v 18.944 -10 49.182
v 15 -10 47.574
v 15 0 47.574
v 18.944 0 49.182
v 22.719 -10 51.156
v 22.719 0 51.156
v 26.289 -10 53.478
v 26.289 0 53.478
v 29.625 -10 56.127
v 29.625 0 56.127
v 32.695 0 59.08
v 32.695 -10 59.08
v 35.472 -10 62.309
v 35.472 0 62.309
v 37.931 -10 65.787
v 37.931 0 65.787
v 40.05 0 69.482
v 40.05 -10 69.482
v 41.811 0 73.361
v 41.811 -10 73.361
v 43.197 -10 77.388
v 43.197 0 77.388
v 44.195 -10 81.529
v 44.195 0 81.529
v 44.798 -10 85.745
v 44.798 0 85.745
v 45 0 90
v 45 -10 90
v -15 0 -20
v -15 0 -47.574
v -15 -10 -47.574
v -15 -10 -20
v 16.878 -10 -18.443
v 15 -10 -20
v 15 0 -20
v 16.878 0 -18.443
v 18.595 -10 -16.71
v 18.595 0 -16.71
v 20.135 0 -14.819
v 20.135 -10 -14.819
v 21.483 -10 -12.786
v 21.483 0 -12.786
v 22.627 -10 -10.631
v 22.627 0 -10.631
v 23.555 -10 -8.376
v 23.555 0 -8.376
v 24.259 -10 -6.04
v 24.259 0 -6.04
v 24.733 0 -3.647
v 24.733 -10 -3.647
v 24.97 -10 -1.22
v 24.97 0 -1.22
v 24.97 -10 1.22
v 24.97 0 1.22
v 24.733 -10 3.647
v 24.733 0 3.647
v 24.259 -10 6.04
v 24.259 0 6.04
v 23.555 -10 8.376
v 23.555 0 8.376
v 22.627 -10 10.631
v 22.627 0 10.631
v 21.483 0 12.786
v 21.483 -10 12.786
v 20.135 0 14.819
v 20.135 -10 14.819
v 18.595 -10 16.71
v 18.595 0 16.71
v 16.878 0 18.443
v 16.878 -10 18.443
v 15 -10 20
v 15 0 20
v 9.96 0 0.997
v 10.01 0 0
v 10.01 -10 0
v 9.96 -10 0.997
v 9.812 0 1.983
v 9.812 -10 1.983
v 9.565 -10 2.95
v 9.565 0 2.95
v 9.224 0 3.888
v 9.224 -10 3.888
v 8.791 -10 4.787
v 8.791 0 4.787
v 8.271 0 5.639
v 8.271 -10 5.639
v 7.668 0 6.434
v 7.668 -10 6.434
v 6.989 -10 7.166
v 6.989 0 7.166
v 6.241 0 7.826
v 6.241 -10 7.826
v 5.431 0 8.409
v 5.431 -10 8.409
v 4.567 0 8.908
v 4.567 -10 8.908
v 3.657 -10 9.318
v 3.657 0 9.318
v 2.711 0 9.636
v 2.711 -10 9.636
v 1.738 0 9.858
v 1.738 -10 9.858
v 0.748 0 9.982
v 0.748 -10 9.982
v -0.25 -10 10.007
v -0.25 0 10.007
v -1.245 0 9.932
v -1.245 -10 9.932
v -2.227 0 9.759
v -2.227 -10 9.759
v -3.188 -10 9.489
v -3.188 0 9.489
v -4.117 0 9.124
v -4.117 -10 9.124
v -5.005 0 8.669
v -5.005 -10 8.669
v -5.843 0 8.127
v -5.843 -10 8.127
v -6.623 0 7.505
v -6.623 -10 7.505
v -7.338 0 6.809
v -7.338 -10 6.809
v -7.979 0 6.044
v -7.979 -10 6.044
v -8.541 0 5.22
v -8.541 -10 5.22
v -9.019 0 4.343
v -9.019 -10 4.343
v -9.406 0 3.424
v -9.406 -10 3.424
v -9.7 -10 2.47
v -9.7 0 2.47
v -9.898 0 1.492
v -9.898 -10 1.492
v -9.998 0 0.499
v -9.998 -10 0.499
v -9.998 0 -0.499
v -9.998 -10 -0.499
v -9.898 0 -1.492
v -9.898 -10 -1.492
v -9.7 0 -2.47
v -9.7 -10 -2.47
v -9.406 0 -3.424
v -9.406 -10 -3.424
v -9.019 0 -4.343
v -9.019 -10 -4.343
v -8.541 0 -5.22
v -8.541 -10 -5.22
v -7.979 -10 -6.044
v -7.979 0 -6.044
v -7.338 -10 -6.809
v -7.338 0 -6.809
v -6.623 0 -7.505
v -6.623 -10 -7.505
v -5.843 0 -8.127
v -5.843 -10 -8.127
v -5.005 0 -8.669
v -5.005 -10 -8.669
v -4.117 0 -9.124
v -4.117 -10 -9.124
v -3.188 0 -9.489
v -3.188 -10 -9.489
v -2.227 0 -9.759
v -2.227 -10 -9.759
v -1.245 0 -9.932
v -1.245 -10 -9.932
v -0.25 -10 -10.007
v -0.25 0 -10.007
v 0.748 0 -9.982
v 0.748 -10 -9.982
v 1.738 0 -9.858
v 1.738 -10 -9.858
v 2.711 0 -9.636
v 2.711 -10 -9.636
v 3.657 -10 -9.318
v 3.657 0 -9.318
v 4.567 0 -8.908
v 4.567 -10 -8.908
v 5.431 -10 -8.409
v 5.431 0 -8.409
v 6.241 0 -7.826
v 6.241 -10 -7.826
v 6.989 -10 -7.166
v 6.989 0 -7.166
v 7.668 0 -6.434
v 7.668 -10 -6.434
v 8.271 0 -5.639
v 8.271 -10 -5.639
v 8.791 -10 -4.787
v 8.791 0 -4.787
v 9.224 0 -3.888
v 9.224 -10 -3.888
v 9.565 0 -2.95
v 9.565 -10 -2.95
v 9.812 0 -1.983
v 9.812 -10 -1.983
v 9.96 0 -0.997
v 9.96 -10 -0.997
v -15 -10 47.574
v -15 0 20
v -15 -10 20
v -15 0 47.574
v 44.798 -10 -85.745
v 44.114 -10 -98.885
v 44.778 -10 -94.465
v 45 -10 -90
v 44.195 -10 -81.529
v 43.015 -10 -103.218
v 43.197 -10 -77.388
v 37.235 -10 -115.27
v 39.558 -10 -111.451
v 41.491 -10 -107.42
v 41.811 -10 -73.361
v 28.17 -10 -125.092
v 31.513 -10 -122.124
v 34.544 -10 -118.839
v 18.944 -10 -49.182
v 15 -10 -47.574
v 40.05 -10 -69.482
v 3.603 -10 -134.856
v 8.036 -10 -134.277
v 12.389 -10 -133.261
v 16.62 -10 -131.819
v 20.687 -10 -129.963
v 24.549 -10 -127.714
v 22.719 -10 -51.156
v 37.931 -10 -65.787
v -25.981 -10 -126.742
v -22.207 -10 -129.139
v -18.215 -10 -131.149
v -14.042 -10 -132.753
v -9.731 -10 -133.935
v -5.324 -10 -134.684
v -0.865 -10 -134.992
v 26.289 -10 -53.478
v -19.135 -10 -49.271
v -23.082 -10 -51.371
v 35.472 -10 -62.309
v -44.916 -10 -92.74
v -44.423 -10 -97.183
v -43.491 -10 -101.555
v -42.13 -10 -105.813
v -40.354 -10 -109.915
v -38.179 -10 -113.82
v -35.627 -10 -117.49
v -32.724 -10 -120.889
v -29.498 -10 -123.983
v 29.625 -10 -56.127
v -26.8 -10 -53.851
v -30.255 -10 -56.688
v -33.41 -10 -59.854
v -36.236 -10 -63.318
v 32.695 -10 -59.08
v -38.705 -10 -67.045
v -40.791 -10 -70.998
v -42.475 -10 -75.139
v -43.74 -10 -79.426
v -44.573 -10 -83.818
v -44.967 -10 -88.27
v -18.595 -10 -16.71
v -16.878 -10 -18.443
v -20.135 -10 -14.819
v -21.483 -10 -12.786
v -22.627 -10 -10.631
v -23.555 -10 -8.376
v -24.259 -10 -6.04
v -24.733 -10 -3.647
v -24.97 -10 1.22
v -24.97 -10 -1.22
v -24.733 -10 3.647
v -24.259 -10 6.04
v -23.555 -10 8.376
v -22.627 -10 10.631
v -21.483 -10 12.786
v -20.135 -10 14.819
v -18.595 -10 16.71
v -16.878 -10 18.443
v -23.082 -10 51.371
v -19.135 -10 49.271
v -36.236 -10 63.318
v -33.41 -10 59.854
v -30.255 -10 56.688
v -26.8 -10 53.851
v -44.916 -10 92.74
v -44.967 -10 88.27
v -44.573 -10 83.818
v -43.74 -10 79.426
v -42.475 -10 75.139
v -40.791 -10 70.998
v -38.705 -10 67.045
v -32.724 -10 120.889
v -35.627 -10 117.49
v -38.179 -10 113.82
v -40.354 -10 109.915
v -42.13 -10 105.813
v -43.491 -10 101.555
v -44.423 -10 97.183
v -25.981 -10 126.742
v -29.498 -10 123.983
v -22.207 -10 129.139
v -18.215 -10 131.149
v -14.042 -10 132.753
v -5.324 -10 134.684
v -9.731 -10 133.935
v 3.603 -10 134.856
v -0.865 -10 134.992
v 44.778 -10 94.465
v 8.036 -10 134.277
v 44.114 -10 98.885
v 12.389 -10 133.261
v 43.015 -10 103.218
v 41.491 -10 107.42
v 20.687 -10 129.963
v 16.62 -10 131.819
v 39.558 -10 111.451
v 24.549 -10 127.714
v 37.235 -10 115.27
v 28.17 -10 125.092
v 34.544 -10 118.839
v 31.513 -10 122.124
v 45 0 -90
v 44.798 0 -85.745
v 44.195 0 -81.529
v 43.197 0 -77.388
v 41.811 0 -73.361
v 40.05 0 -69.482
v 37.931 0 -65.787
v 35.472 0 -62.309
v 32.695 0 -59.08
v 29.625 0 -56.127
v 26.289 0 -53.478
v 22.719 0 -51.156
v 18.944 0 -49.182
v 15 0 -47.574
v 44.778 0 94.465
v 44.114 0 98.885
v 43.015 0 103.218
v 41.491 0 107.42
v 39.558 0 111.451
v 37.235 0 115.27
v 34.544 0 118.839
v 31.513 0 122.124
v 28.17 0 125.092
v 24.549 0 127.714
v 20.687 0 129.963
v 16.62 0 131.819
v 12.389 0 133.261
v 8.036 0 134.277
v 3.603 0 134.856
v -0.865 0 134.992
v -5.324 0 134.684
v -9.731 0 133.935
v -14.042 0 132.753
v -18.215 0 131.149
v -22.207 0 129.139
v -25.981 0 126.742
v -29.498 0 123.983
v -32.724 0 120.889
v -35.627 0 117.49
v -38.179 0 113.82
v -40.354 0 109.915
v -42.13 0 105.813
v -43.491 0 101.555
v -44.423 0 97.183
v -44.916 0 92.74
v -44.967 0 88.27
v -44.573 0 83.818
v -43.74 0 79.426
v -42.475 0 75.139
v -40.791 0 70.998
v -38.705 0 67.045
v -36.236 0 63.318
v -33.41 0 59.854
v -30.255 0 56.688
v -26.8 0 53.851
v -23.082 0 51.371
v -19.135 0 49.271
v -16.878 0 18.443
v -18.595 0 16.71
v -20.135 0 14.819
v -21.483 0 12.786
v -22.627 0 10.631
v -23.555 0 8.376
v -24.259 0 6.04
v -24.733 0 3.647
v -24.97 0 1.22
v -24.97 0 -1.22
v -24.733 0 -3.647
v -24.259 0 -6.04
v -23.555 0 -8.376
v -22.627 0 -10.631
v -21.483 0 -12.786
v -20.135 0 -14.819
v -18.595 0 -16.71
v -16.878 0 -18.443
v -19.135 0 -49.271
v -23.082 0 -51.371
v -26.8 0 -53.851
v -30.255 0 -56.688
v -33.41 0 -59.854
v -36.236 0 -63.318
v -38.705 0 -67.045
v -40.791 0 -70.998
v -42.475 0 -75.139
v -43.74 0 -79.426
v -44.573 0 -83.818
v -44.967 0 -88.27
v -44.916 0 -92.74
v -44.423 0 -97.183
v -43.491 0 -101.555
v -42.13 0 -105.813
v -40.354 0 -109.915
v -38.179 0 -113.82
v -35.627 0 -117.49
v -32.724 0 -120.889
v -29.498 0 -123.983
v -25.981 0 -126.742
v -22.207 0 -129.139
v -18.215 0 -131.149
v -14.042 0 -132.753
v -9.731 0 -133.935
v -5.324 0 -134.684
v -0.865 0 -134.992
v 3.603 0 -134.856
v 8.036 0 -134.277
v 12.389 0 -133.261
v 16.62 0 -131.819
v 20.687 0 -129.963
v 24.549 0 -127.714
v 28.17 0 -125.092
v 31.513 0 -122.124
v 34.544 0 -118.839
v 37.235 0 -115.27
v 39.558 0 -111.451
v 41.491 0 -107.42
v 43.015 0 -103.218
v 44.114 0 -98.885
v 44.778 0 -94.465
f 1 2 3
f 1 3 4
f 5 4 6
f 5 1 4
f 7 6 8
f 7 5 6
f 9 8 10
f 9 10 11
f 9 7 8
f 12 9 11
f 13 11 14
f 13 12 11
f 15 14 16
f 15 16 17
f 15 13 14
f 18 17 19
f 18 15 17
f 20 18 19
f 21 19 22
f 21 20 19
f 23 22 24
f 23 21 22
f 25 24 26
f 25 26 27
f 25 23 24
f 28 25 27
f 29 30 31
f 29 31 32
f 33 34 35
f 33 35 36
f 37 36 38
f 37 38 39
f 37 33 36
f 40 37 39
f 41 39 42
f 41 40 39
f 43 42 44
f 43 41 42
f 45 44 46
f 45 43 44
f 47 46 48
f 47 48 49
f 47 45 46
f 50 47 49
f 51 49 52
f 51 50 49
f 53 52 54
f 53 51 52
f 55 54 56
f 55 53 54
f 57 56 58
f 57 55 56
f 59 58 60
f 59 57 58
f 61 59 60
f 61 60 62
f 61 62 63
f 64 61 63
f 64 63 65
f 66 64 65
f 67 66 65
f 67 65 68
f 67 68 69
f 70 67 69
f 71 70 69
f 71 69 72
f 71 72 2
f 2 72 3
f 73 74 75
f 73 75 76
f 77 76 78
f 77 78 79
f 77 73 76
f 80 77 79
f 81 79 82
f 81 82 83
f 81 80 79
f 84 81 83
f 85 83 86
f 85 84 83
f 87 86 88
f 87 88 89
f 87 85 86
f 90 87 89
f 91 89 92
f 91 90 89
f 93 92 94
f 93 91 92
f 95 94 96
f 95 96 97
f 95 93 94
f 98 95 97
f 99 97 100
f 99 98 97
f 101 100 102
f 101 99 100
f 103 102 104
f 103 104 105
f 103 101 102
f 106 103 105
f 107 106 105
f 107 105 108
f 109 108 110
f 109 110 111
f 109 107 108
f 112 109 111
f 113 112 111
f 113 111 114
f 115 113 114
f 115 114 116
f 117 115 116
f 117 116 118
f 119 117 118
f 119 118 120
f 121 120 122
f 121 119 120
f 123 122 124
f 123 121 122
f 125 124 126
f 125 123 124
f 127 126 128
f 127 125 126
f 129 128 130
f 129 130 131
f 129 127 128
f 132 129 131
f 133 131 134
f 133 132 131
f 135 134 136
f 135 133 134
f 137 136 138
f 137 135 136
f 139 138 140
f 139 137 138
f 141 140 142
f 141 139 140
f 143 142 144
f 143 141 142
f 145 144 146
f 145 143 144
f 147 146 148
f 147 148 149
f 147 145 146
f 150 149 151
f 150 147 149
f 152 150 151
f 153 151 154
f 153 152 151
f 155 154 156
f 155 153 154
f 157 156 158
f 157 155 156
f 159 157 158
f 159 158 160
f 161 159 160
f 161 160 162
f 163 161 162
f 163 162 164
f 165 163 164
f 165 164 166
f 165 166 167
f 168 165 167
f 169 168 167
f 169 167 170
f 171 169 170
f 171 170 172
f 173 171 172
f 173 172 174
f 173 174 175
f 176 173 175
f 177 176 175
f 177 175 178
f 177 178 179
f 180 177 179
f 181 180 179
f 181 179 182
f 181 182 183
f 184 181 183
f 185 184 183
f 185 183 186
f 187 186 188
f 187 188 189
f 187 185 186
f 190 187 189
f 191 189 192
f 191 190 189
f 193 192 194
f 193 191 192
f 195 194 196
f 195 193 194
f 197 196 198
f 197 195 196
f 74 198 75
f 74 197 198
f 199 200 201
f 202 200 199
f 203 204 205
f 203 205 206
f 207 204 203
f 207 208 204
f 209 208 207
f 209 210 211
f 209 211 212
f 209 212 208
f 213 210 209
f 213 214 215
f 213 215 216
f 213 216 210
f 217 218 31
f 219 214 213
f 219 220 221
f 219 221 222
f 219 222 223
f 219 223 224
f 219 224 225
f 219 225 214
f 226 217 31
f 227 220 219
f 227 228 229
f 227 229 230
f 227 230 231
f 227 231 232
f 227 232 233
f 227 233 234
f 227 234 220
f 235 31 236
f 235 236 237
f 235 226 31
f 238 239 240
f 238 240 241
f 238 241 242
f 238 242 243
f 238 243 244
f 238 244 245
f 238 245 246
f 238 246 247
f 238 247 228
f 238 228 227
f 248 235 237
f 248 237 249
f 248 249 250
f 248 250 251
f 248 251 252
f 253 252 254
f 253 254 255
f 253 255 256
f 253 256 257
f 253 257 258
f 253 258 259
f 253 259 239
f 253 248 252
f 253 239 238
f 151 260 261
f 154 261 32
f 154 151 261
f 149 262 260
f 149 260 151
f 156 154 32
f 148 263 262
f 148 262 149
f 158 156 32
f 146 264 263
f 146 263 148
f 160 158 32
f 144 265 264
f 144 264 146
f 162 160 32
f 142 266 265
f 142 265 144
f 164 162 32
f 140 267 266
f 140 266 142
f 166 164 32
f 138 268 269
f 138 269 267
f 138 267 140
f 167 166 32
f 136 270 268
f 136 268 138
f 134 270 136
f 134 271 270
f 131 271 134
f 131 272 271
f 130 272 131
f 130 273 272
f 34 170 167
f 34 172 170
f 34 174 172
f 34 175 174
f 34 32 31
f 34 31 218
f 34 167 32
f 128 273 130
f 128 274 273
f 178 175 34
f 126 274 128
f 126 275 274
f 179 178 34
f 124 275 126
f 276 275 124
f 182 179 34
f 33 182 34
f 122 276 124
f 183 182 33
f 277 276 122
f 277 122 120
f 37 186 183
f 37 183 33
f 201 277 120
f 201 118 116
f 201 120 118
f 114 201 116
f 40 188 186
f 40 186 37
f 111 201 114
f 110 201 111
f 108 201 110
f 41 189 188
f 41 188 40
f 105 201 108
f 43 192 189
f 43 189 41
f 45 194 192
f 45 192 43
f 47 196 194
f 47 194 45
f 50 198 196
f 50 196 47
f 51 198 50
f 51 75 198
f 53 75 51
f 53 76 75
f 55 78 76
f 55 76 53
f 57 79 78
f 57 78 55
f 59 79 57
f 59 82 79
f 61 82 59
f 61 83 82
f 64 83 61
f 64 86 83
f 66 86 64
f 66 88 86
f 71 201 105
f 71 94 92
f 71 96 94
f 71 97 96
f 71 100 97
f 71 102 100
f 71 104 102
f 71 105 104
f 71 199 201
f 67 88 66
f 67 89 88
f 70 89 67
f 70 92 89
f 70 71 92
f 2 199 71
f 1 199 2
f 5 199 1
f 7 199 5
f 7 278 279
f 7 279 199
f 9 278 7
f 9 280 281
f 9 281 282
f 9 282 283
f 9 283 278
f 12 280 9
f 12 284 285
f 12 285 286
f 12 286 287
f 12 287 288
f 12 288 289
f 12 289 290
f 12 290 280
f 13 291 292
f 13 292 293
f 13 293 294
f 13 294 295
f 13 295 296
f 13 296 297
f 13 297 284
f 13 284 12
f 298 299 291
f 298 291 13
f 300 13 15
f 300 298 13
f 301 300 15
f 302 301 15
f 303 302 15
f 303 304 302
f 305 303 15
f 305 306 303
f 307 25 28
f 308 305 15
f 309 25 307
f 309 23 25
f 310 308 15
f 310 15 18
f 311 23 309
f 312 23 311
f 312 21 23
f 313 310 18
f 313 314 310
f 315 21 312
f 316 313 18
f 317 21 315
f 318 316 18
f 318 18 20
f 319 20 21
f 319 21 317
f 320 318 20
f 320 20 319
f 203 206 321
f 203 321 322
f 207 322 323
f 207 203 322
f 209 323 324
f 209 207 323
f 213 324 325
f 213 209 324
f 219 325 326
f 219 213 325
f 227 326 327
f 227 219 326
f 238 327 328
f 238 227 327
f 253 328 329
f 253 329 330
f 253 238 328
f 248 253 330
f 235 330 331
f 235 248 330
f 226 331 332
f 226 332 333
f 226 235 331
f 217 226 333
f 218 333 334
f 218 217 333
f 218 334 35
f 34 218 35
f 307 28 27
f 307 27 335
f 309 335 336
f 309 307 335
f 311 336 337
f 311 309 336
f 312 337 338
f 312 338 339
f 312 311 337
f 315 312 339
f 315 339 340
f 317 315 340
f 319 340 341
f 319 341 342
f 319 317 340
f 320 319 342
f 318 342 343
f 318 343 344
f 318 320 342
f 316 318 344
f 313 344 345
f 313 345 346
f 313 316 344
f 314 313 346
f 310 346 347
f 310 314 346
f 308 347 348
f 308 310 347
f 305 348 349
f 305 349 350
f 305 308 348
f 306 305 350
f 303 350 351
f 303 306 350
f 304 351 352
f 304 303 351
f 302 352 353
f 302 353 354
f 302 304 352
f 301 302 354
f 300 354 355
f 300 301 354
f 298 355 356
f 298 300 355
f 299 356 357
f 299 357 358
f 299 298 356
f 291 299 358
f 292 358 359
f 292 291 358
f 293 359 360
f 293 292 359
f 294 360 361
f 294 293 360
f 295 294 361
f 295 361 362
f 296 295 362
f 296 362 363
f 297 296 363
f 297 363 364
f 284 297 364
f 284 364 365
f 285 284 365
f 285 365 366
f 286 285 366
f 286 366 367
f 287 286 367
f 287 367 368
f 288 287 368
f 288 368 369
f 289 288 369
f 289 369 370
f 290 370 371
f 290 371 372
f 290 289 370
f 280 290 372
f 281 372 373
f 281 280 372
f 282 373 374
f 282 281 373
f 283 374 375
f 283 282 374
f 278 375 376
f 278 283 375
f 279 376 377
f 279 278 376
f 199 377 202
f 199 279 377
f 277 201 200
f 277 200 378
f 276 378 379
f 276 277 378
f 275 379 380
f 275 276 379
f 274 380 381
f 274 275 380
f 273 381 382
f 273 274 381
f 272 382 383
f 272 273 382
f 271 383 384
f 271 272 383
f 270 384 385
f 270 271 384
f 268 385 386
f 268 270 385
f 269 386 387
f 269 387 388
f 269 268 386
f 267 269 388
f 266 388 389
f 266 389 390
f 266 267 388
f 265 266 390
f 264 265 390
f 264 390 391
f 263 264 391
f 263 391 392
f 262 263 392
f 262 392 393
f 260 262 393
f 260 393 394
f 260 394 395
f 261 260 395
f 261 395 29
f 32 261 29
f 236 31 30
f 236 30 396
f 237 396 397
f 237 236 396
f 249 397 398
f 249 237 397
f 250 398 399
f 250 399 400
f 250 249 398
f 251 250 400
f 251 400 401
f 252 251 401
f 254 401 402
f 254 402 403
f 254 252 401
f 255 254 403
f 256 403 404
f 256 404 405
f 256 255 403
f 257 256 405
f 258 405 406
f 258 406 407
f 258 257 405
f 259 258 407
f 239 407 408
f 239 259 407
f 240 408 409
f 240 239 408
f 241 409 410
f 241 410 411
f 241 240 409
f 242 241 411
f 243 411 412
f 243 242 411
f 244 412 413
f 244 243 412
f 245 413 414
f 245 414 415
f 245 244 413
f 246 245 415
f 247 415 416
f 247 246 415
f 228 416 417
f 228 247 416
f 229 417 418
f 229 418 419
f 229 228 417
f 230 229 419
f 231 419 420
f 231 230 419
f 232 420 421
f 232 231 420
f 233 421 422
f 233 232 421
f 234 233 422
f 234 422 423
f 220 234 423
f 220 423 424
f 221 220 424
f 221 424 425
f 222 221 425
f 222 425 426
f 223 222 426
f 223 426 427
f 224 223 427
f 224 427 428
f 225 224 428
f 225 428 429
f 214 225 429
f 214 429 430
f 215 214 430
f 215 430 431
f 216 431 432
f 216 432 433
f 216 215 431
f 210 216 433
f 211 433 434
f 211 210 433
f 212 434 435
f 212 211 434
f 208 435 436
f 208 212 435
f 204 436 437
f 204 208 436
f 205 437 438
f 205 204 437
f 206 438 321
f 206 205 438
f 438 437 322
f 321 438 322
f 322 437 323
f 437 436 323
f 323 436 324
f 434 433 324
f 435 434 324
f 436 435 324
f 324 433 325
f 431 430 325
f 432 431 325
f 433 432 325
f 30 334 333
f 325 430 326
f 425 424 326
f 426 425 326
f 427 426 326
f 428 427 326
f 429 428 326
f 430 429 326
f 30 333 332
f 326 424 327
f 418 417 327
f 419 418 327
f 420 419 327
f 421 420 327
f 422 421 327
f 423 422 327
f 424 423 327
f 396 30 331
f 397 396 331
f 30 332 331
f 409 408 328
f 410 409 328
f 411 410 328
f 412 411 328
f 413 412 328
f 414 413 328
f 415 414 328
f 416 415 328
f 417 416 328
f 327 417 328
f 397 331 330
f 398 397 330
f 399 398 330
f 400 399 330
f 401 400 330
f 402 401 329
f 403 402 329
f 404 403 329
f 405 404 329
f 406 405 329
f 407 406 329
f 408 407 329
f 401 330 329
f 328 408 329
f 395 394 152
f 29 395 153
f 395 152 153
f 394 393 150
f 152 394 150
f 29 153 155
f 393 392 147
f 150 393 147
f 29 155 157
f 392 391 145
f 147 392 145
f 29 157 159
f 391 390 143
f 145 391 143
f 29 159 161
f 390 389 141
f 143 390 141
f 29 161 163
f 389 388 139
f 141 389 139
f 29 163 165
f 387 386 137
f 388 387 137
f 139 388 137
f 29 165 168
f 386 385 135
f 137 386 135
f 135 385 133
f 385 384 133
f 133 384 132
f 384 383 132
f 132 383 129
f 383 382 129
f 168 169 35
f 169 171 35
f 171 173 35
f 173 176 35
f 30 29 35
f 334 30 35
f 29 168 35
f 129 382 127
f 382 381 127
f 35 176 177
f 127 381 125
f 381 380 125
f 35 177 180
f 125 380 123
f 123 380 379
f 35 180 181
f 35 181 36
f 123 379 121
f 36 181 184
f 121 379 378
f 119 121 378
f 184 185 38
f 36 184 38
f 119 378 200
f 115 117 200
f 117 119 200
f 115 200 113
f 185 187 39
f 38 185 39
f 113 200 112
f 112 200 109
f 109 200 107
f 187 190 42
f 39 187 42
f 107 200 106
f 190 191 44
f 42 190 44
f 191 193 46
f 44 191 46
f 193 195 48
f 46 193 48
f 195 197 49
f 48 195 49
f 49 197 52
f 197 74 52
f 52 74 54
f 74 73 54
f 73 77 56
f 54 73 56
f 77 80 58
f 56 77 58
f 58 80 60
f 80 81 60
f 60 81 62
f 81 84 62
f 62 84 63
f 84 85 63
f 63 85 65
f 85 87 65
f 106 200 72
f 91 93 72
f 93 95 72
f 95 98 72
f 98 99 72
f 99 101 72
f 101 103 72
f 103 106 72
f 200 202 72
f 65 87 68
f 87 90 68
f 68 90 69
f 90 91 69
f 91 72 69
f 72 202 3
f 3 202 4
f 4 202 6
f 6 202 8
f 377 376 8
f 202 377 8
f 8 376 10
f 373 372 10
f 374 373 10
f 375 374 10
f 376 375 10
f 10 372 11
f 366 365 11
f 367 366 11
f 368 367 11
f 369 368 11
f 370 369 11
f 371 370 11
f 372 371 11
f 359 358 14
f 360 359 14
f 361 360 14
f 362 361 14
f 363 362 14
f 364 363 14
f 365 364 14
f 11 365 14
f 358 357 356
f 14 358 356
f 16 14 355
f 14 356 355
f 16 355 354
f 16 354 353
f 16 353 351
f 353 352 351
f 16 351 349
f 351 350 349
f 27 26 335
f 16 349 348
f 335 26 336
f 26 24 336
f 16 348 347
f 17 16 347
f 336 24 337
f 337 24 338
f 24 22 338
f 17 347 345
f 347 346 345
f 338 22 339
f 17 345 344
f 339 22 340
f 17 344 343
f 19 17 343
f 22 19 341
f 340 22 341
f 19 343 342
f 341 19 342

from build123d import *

# Parameters (mm, degrees)
F0_W     = 30
F0_H     = 180
F0_R     = 10.01
F1_DEPTH = 10
F2_R     = 10.01
F3_DEPTH = 10
F5_DEPTH = 10


with BuildPart() as f1:
    # F0 (on Front) → F1 (new body)
    with BuildSketch(Plane.XZ):
        Rectangle(F0_W, F0_H)
        Circle(F0_R, mode=Mode.SUBTRACT)
    extrude(amount=F1_DEPTH)

    # F2 (on face) → F3 (join)
    with BuildSketch(Plane.XZ.offset(10)):
        with BuildLine():
            Line((-15, -20), (-15, 20))
            ThreePointArc((-15, 20), (-25, 0), (-15, -20))
        make_face()
        with BuildLine():
            Line((15, -20), (15, 20))
            ThreePointArc((15, 20), (0, 25), (-15, 20))
            Line((-15, 20), (-15, -20))
            ThreePointArc((-15, -20), (0, -25), (15, -20))
        make_face()
        Circle(F2_R, mode=Mode.SUBTRACT)
        with BuildLine():
            ThreePointArc((15, -20), (22.360679775, -11.1803398875), (25, 0))
            ThreePointArc((25, 0), (22.360679775, 11.1803398875), (15, 20))
            Line((15, 20), (15, -20))
        make_face()
    extrude(amount=-F3_DEPTH)

    # F4 (on face) → F5 (join)
    with BuildSketch(Plane.XZ.offset(10)):
        with BuildLine():
            Line((-15, -90), (-15, -47.5735931288))
            ThreePointArc((-15, -47.5735931288), (-25.9807621135, -126.7423461417), (45, -90))
            ThreePointArc((45, -90), (36.7423461417, -64.0192378865), (15, -47.5735931288))
            Line((15, -47.5735931288), (15, -90))
            Line((15, -90), (-15, -90))
        make_face()
        with BuildLine():
            ThreePointArc((15, -47.5735931288), (0, -45), (-15, -47.5735931288))
            Line((-15, -47.5735931288), (-15, -90))
            Line((-15, -90), (15, -90))
            Line((15, -90), (15, -47.5735931288))
        make_face()
        with BuildLine():
            ThreePointArc((15, 47.5735931288), (36.7423461417, 64.0192378865), (45, 90))
            ThreePointArc((45, 90), (-25.9807621135, 126.7423461417), (-15, 47.5735931288))
            Line((-15, 47.5735931288), (-15, 90))
            Line((-15, 90), (15, 90))
            Line((15, 90), (15, 47.5735931288))
        make_face()
        with BuildLine():
            Line((-15, 90), (-15, 47.5735931288))
            ThreePointArc((-15, 47.5735931288), (0, 45), (15, 47.5735931288))
            Line((15, 47.5735931288), (15, 90))
            Line((15, 90), (-15, 90))
        make_face()
    extrude(amount=-F5_DEPTH)


solid = f1.part
